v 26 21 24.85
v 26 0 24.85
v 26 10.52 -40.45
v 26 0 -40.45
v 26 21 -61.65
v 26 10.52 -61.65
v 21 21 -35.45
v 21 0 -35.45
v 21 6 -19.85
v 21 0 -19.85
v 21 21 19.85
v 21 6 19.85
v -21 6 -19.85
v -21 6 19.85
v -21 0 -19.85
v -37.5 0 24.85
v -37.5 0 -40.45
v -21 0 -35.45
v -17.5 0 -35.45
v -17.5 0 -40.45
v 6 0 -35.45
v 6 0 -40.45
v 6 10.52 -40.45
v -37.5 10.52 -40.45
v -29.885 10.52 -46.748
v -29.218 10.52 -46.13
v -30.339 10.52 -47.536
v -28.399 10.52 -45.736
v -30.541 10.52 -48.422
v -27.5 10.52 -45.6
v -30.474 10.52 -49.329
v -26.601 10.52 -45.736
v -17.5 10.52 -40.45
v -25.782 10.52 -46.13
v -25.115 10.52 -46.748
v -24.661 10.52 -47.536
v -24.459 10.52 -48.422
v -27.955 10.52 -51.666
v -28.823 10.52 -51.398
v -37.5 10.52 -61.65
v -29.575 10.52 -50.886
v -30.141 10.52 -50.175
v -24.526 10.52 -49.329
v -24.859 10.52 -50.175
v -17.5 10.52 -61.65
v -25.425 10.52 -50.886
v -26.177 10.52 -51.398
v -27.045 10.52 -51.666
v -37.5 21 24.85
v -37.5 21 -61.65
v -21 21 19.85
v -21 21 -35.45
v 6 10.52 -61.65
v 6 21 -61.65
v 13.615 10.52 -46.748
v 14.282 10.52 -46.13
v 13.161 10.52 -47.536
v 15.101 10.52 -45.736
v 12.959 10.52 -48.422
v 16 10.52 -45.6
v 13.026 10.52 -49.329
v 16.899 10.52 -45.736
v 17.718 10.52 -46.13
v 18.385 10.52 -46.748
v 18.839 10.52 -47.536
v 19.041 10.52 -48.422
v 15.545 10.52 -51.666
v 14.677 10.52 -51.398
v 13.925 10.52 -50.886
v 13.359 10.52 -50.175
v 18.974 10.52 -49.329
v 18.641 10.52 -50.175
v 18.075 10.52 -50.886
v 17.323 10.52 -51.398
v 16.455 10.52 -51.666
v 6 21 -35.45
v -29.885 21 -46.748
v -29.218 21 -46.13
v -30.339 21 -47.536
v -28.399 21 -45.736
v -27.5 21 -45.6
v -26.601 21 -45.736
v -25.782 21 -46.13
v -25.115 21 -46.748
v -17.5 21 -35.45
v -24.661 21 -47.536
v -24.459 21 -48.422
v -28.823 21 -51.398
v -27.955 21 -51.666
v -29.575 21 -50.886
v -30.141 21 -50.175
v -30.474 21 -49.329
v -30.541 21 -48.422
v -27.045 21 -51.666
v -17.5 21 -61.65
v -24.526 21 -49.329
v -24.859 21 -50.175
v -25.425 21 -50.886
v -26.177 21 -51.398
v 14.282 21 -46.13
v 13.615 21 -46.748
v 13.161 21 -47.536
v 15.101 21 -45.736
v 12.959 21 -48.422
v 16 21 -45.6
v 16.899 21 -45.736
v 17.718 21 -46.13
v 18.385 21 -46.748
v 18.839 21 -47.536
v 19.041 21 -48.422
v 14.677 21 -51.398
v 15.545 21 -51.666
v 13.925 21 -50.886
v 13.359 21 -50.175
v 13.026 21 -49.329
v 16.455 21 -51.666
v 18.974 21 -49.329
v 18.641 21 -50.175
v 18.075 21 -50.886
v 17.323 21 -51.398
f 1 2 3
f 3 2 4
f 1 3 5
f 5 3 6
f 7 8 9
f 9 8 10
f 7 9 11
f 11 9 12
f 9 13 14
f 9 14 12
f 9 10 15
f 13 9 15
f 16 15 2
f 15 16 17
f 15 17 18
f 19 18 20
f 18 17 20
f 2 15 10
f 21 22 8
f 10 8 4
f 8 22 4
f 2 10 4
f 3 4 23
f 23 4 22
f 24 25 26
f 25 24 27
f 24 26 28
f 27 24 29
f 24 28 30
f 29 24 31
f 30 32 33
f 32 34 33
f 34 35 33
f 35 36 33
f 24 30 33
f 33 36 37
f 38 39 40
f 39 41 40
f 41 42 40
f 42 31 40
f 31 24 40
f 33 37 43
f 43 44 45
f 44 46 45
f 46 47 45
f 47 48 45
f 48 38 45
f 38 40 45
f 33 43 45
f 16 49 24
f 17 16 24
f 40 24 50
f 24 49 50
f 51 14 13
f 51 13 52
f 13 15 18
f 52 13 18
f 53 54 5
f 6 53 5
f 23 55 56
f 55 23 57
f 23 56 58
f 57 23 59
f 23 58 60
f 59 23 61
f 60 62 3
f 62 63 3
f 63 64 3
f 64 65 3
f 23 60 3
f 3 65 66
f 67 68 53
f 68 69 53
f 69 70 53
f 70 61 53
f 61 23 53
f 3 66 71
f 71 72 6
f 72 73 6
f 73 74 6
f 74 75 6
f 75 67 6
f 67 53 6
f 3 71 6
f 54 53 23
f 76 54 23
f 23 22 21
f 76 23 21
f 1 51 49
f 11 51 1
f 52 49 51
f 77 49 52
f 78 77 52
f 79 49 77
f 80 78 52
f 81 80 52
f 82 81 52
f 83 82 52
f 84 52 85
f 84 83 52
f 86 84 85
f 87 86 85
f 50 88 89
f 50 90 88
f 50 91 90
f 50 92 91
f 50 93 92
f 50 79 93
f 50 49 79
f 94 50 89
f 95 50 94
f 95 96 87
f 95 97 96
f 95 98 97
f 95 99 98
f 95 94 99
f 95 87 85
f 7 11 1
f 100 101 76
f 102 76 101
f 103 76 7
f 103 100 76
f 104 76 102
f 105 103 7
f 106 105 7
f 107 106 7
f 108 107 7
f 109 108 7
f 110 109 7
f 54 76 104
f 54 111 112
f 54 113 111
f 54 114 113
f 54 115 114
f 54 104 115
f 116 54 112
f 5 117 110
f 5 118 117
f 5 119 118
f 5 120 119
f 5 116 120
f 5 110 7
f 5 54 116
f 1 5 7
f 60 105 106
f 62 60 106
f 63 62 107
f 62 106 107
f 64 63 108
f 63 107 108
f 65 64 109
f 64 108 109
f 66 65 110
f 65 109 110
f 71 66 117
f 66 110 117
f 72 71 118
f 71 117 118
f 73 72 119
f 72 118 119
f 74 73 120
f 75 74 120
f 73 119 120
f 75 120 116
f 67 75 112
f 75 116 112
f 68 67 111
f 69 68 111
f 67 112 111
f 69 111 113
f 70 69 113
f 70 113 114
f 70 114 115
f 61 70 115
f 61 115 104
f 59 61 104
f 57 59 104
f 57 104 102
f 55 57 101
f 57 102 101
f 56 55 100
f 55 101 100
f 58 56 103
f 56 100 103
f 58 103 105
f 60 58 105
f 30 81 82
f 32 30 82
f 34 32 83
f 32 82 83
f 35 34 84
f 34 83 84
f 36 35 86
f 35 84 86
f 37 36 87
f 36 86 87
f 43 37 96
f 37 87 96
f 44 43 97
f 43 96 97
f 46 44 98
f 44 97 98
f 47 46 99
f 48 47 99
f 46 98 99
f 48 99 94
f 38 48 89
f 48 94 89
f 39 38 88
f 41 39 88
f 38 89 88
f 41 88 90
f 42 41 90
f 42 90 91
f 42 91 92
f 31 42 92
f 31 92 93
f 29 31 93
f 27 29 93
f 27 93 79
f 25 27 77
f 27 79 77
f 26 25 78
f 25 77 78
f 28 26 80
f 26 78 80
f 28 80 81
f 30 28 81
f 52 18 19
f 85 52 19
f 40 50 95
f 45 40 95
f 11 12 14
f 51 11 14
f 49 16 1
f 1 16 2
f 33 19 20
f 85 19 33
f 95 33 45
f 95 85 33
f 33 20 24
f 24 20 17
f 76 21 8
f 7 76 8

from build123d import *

# Parameters (mm, degrees)
BOSS_EXTRUDE1_DEPTH = 6
BOSS_EXTRUDE2_DEPTH = 21
BOSS_EXTRUDE3_START = 21
SKETCH1_6_W         = 20
SKETCH1_6_H         = 21.2
SKETCH1_6_R         = 3.05
BOSS_EXTRUDE3_DEPTH = 10.48


with BuildPart() as part:
    # Sketch1 → Boss-Extrude1 (new body)
    with BuildSketch(Plane(origin=(0, 0, 0), x_dir=(1, 0, 0), z_dir=(0, 1, 0))):
        Polygon((-37.5, 40.45), (-37.5, -24.85), (26, -24.85), (26, 40.45), (6, 40.45), (6, 35.45), (21, 35.45), (21, 19.85), (-21, 19.85), (-21, 35.45), (-17.5, 35.45), (-17.5, 40.45), align=None)
    extrude(amount=BOSS_EXTRUDE1_DEPTH)

    # Sketch1_5 → Boss-Extrude2 (add)
    with BuildSketch(Plane(origin=(0, 0, 0), x_dir=(1, 0, 0), z_dir=(0, 1, 0))):
        Polygon((-37.5, 40.45), (-37.5, -24.85), (26, -24.85), (26, 40.45), (6, 40.45), (6, 35.45), (21, 35.45), (21, 19.85), (21, -19.85), (-21, -19.85), (-21, 19.85), (-21, 35.45), (-17.5, 35.45), (-17.5, 40.45), align=None)
    extrude(amount=BOSS_EXTRUDE2_DEPTH)

    # Sketch1_6 → Boss-Extrude3 (add)
    with BuildSketch(Plane(origin=(0, 0, 0), x_dir=(1, 0, 0), z_dir=(0, 1, 0)).offset(BOSS_EXTRUDE3_START)):
        with Locations((-27.5, 51.05)):
            Rectangle(SKETCH1_6_W, SKETCH1_6_H)
        with Locations(Location((-27.5, 48.65, 0), (0, 0, 270))):
            Circle(SKETCH1_6_R, mode=Mode.SUBTRACT)
        with Locations((16, 51.05)):
            Rectangle(SKETCH1_6_W, SKETCH1_6_H)
        with Locations(Location((16, 48.65, 0), (0, 0, 270))):
            Circle(SKETCH1_6_R, mode=Mode.SUBTRACT)
    extrude(amount=-BOSS_EXTRUDE3_DEPTH)


solid = part.part
